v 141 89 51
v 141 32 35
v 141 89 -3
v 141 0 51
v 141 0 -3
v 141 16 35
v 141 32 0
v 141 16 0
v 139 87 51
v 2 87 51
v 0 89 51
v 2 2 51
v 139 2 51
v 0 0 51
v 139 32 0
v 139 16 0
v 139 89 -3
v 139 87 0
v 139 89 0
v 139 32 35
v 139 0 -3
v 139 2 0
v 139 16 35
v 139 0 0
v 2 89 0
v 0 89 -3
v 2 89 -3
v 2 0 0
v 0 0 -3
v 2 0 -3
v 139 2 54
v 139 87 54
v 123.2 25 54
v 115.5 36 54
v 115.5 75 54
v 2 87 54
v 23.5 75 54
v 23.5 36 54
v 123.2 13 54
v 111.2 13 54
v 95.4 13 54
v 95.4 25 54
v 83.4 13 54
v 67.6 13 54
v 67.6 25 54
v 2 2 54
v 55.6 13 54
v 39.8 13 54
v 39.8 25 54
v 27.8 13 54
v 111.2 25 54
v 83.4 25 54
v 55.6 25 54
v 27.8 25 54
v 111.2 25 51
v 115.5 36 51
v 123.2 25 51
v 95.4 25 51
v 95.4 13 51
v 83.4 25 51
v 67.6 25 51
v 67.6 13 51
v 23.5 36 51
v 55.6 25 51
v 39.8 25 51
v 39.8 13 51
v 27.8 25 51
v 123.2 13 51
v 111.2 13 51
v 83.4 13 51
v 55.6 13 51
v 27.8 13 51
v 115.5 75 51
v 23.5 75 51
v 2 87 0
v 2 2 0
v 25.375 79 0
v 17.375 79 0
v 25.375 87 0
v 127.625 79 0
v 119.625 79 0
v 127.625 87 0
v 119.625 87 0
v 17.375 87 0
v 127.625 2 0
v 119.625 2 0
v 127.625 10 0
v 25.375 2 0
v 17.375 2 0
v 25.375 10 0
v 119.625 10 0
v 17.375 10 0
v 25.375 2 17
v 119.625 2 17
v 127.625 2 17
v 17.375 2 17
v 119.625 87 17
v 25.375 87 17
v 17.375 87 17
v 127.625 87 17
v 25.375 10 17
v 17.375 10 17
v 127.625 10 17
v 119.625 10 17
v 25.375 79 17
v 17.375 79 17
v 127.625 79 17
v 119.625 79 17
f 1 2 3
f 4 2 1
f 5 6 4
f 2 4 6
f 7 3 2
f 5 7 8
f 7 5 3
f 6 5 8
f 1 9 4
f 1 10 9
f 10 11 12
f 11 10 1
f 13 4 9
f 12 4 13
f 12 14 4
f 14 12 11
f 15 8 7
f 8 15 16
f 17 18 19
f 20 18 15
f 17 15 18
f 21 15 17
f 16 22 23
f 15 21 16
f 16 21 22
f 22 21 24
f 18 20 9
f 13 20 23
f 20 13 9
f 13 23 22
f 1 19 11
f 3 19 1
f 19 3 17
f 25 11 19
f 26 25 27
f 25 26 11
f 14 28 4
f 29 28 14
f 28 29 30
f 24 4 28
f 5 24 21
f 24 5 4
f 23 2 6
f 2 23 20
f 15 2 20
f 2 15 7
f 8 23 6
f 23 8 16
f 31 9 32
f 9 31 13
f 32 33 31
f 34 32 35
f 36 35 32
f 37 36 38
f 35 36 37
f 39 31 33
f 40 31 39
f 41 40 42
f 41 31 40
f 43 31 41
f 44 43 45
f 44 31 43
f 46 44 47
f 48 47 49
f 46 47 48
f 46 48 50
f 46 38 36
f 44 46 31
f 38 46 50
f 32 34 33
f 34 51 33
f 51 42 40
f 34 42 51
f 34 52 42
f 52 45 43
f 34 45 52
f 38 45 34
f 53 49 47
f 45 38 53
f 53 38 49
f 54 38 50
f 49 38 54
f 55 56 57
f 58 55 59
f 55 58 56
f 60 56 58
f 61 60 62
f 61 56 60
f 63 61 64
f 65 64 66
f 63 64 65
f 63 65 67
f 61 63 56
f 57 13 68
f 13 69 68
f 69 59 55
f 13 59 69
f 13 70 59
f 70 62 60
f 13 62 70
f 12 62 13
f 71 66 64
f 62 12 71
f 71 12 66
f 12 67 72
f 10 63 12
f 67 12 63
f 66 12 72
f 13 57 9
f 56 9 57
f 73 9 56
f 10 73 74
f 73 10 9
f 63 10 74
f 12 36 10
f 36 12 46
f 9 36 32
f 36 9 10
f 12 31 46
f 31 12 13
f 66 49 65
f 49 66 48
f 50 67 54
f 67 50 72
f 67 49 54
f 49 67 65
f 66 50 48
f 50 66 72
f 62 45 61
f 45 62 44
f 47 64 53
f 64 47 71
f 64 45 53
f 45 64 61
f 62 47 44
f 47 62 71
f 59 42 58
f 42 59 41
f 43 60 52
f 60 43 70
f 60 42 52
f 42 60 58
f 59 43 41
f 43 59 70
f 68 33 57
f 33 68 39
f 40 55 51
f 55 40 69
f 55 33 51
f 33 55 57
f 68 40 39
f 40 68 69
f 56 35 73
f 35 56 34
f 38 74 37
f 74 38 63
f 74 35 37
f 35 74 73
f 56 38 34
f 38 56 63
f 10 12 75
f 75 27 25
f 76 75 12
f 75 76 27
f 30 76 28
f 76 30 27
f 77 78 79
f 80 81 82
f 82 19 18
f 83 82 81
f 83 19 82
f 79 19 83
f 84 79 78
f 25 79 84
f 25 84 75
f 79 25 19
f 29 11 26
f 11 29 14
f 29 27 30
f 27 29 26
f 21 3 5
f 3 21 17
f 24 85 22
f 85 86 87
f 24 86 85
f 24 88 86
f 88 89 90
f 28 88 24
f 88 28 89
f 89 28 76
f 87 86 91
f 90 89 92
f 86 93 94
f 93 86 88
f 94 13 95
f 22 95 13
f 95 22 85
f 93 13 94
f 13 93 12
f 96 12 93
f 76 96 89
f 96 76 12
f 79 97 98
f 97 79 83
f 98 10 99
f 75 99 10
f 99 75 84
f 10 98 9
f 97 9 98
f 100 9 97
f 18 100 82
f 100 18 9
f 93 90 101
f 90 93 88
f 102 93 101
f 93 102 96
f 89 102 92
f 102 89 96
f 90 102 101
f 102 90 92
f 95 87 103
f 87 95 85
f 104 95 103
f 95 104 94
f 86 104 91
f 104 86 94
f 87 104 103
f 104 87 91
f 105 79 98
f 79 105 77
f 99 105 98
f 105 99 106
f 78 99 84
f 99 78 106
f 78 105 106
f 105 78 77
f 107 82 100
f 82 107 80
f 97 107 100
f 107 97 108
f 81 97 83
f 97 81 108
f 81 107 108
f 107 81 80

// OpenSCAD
// Set basic attributes
wallThickness = 2;
lidThickness = 3;
boxLength = 139;
boxWidth = 87;
boxHeight = 51;
screwFixingWidth = 8;
lipDepth = 3;
lcdHoleLength =92;
lcdHoleWidth = 39;
buttonWidth = 12;
lidInStep = 2;


// Create one of the ends
cube([wallThickness,boxWidth+wallThickness,boxHeight]);



// Create the lips the 2 ends need for the wooden base to butt up to
translate([0,0,-lipDepth]) cube([wallThickness,boxWidth+wallThickness,lipDepth]);
translate([boxLength,0,0]) translate([0,0,-lipDepth]) cube([wallThickness,boxWidth+wallThickness,lipDepth]);



// Create the 2 sides
cube([boxLength,wallThickness,boxHeight]);
translate([0,boxWidth,0]) cube([boxLength+wallThickness,wallThickness,boxHeight]);



// Create the screw fixings for the base
translate([boxLength/8,wallThickness,0]) cube([screwFixingWidth,screwFixingWidth,boxHeight / 3]);
translate([boxLength - (boxLength/8)- wallThickness, wallThickness,0]) cube([screwFixingWidth,screwFixingWidth,boxHeight / 3]);
translate([boxLength/8,boxWidth-screwFixingWidth,0]) cube([screwFixingWidth,screwFixingWidth,boxHeight / 3]);
translate([boxLength - (boxLength/8)- wallThickness,boxWidth-screwFixingWidth,0]) cube([screwFixingWidth,screwFixingWidth,boxHeight / 3]);


// Create the other end, with a for the sockets to fit through
difference() {
translate([boxLength,0,0]) cube([wallThickness,boxWidth+wallThickness,boxHeight]);
translate([boxLength - 10,16,0]) cube([20,16,35]);
}



// Create the lid with holes cut out for the buttons and LCD
difference() {
    difference() {
        difference() {
            difference() {
                difference() {
                    translate([lidInStep,lidInStep,boxHeight]) cube([boxLength+wallThickness-(2*lidInStep),boxWidth+          wallThickness-(2 * lidInStep),lidThickness]);
                    translate([boxLength/5,(boxWidth-lcdHoleWidth-12-(buttonWidth/2))/2-wallThickness,boxHeight - 10]) cube([buttonWidth,buttonWidth,40]);
                };
                translate([(boxLength/5)*2,(boxWidth-lcdHoleWidth-12-(buttonWidth/2))/2-wallThickness,boxHeight - 10]) cube([buttonWidth,buttonWidth,40]);
            };
            translate([(boxLength/5)*3,(boxWidth-lcdHoleWidth-12-(buttonWidth/2))/2-wallThickness,boxHeight - 10]) cube([buttonWidth,buttonWidth,40]);
        };
        translate([boxLength-(boxLength/5),(boxWidth-lcdHoleWidth-12-(buttonWidth/2))/2-wallThickness,boxHeight - 10]) cube([buttonWidth,buttonWidth,40]);
    };
    translate([(boxLength/2)-(lcdHoleLength/2),boxWidth-lcdHoleWidth-12,boxHeight - 10]) cube([lcdHoleLength,lcdHoleWidth,40]);
}
